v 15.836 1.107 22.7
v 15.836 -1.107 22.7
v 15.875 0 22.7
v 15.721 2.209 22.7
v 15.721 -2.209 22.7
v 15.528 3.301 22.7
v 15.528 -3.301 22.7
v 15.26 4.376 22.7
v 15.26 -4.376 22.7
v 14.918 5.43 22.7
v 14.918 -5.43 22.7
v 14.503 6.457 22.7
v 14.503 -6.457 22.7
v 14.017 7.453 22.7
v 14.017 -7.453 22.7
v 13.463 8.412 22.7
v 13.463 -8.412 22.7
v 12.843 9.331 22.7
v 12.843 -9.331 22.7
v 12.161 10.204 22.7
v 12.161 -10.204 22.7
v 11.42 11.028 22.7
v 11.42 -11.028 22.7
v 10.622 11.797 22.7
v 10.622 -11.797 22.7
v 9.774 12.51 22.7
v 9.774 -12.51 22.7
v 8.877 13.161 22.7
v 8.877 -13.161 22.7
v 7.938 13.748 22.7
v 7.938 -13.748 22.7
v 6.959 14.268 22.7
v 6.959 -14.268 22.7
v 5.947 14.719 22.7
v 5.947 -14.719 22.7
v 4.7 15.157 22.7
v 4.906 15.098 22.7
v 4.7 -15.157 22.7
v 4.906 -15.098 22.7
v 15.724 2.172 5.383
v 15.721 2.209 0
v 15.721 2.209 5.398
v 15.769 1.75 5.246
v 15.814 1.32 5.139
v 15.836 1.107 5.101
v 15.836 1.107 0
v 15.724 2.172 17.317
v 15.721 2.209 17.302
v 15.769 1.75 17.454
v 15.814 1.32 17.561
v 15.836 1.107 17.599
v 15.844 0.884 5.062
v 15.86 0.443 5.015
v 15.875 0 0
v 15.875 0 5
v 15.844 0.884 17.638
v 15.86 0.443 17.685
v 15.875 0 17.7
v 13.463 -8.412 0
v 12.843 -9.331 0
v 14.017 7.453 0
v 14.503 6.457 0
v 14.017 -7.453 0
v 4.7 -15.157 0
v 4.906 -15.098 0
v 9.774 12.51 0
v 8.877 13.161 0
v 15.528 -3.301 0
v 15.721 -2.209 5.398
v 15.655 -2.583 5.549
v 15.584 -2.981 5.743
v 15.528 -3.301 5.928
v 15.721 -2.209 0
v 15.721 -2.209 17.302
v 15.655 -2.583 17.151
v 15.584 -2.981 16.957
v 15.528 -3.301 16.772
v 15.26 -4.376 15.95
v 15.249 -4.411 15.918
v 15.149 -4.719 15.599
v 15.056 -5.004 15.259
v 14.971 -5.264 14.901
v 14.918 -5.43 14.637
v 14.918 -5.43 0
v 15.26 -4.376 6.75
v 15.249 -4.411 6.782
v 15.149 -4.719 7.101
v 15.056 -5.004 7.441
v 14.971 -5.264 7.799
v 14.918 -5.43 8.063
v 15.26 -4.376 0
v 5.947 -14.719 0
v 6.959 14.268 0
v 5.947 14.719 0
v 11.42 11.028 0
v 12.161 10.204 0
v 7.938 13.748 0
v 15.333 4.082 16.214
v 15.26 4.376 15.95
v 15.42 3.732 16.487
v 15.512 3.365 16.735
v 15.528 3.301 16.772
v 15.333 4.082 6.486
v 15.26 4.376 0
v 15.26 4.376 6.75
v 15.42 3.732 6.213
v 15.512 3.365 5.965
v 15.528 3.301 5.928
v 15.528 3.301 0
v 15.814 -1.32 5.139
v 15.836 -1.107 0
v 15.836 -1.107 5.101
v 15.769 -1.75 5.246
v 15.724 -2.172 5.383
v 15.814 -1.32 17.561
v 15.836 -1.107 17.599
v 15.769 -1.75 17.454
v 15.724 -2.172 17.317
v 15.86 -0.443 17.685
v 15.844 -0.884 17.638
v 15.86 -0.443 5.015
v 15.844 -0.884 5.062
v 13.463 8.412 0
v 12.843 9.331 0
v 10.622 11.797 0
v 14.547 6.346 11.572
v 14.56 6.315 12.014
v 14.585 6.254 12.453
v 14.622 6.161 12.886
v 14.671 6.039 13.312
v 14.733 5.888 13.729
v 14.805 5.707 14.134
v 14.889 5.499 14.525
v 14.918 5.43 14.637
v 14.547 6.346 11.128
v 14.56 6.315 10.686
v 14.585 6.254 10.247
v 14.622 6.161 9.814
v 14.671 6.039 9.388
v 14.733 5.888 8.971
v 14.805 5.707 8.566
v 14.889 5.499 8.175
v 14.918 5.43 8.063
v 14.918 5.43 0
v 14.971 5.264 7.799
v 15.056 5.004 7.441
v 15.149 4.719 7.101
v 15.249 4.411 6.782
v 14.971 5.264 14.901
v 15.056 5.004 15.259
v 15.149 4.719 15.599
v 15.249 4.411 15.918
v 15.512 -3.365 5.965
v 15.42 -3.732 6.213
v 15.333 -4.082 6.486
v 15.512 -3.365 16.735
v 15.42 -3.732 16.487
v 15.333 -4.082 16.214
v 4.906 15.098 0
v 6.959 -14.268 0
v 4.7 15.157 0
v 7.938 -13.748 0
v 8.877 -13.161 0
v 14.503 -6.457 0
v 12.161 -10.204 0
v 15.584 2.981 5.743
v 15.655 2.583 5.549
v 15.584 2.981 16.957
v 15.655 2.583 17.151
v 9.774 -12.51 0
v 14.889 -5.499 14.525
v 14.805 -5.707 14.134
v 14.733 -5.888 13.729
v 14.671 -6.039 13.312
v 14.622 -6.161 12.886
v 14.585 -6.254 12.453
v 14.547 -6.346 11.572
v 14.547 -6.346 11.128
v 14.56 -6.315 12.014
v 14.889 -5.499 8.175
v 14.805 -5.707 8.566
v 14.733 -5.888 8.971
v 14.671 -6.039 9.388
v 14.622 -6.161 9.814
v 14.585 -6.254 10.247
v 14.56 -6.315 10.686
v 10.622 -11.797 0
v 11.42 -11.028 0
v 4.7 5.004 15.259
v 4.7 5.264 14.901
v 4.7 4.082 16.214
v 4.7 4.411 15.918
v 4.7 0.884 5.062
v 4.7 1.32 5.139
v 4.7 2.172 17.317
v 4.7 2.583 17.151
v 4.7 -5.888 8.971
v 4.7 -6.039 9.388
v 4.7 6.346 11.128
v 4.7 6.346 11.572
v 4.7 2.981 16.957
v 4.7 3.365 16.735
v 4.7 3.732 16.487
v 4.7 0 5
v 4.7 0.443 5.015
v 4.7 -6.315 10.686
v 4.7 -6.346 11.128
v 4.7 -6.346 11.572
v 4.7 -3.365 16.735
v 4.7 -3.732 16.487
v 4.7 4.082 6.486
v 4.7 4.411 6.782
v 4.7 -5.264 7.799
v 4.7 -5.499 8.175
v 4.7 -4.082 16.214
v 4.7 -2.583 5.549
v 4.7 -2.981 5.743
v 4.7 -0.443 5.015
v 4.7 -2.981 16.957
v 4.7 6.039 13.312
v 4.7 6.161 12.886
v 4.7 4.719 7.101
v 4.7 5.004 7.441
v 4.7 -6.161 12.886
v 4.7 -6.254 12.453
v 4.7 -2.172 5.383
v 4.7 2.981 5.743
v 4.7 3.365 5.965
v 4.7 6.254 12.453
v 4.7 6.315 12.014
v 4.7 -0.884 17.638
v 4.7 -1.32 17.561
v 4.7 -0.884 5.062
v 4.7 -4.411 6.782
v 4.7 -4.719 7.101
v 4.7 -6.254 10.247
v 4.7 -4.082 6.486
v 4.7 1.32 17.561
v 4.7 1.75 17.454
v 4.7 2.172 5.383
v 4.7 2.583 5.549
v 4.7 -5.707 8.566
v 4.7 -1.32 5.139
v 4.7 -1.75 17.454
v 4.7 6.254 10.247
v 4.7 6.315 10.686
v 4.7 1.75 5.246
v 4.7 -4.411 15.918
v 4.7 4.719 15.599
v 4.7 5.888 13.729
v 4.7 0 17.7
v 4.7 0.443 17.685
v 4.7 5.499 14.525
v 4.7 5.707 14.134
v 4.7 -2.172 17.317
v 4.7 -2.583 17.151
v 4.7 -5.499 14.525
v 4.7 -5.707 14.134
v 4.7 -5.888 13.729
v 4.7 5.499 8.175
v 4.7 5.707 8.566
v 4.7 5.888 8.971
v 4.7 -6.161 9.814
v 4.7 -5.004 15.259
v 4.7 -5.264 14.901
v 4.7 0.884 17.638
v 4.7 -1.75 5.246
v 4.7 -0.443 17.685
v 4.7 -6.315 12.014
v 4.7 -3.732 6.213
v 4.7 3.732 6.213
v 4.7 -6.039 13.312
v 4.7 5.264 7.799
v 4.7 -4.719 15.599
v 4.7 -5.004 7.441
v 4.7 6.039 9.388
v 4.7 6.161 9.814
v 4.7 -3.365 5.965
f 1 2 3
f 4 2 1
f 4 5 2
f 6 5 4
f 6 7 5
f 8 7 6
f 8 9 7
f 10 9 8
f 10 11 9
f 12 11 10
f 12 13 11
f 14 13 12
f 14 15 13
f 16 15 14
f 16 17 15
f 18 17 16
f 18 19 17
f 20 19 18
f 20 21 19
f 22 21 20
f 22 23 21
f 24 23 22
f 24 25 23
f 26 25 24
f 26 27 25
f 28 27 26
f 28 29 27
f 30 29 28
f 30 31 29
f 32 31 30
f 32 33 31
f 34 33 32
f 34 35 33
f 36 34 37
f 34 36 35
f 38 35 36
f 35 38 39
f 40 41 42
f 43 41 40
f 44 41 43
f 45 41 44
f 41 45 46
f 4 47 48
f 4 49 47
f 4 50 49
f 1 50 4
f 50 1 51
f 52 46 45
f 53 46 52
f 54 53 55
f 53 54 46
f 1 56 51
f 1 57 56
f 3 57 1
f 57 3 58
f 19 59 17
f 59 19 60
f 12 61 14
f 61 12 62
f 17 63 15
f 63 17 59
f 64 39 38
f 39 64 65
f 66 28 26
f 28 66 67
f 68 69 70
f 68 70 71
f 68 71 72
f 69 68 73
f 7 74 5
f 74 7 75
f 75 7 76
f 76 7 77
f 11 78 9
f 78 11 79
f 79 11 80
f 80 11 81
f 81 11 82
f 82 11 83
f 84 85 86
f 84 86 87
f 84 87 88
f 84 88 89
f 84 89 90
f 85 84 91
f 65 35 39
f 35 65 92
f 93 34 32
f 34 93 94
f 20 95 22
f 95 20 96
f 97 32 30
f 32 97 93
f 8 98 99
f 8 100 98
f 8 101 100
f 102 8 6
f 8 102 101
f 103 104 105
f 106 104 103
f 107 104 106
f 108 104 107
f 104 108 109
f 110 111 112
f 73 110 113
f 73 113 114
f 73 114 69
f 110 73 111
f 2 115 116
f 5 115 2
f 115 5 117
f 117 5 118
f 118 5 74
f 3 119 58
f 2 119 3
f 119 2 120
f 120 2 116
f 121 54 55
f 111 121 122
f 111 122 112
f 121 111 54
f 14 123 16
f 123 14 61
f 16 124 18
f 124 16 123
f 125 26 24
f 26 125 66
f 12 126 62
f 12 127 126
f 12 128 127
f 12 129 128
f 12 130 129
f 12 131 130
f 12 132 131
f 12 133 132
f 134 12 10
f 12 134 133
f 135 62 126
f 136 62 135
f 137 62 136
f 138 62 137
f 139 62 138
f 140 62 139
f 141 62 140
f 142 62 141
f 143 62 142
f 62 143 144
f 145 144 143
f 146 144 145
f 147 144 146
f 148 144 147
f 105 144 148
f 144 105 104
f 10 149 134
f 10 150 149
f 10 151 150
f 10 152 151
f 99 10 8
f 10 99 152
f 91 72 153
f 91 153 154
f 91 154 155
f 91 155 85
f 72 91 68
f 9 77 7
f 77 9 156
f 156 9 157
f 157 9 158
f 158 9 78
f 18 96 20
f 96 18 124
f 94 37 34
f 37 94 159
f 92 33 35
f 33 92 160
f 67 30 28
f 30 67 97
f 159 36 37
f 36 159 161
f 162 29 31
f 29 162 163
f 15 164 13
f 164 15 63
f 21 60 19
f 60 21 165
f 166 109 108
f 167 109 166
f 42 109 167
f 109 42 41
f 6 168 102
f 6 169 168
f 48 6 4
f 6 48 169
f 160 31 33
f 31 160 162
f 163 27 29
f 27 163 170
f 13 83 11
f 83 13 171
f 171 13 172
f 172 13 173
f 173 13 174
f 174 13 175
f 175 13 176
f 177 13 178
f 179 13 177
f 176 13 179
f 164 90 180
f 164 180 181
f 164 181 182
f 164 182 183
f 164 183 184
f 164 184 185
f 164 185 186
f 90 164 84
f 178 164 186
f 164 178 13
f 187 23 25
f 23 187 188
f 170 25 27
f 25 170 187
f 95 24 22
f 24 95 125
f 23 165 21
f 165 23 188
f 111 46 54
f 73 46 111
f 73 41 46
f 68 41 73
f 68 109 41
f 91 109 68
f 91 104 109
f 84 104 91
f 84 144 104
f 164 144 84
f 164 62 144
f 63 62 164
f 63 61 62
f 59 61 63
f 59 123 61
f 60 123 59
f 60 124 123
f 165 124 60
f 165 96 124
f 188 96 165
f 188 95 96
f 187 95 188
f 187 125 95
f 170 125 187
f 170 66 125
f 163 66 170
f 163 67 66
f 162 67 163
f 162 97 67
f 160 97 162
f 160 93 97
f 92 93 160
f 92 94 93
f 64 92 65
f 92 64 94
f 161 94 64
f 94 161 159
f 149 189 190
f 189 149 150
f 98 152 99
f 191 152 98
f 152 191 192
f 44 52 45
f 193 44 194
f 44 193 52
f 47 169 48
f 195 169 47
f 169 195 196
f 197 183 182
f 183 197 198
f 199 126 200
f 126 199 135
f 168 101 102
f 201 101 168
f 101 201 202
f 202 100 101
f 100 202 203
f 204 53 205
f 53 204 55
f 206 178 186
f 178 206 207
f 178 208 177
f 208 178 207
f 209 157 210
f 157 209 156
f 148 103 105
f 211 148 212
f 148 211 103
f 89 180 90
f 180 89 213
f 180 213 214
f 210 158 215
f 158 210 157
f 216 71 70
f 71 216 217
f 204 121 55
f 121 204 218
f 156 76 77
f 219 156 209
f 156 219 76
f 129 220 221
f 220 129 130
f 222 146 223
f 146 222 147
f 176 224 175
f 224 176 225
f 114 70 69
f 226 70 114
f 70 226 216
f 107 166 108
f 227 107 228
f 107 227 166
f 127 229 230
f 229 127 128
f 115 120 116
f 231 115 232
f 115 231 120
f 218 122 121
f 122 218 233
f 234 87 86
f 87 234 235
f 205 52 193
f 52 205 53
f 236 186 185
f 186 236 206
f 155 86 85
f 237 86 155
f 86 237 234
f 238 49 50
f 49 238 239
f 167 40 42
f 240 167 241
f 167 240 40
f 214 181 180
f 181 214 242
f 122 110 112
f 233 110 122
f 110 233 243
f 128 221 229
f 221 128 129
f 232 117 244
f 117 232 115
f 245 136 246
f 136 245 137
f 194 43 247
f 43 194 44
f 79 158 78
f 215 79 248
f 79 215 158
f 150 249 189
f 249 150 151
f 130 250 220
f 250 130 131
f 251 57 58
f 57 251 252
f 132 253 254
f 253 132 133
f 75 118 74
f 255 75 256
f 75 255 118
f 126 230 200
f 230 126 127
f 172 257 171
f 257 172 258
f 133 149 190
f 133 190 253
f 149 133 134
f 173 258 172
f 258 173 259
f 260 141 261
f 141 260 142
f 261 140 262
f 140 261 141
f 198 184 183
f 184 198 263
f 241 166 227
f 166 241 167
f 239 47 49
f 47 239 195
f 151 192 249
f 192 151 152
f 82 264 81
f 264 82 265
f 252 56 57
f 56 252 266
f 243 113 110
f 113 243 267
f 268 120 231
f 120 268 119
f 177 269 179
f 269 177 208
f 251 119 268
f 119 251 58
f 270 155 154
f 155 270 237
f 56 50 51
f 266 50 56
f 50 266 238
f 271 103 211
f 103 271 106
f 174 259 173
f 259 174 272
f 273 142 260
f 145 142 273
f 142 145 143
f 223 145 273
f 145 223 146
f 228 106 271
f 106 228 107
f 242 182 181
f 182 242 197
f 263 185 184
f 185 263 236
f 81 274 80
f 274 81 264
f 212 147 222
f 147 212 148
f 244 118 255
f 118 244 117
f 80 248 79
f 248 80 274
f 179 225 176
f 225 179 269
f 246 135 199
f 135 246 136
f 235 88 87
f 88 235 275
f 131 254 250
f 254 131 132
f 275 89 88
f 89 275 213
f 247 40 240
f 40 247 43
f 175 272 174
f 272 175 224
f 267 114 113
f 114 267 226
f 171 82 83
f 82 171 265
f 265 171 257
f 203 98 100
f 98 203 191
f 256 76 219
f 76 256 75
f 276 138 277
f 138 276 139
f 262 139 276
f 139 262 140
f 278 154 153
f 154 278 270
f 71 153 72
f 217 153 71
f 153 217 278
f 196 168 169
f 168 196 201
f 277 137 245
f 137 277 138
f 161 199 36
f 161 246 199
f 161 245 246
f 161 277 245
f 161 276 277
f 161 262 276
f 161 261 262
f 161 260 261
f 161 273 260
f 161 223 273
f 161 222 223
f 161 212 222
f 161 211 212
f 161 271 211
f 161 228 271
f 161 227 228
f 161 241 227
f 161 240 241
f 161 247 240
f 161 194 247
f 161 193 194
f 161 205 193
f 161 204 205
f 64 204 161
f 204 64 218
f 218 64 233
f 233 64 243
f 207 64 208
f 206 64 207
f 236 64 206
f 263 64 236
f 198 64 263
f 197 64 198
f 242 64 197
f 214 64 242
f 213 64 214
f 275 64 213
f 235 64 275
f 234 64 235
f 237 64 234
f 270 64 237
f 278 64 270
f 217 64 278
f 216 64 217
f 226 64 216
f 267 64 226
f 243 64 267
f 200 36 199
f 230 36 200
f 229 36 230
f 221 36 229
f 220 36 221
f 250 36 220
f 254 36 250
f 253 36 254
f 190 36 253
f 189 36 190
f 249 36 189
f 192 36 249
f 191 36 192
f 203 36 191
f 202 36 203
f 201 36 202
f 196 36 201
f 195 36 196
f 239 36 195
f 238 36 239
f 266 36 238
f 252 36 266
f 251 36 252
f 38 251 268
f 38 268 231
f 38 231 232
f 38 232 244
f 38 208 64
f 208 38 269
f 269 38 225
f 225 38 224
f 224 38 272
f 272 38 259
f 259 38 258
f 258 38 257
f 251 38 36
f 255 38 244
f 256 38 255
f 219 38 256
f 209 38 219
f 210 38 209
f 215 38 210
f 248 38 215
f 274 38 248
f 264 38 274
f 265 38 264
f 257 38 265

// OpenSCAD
// file: dim.scad
MM_TO_INCHES = 1 / 25.4;
INCHES_TO_MM = 25.4;

D_FORWARD			= 1.00 * INCHES_TO_MM;
D_AFT				= 1.25 * INCHES_TO_MM;	// FIXME
R_FORWARD 			=  D_FORWARD / 2;
R_AFT 				= D_AFT / 2;

D_PORT_SCREW		= 0.5 * INCHES_TO_MM;	// FIXME
R_PORT_SCREW 		= D_PORT_SCREW / 2;
PORT_SCREW_PAD		= 5;
PORT_LEN			= D_PORT_SCREW + PORT_SCREW_PAD * 2;

H_PORT				= 8;	// FIXME

FACES 				= 90;
// file: ../shapes.scad
FACES = 180;
EPSILON = 0.1;

module tube(p_h, rOuter, rInner) {
	difference() {
		cylinder(h=p_h, r=rOuter, $fn=FACES);
		translate([0,0,-EPSILON]) {
			cylinder(h=p_h + EPSILON*2, r=rInner, $fn=FACES);
		}
	}
}
// main file
use <../threads.scad>
use <../shapes.scad>
include <dim.scad>

intersection() {
    difference() {
        cylinder(h=PORT_LEN, r=R_AFT, $fn=FACES);
        translate([0,0,PORT_SCREW_PAD + R_PORT_SCREW]) {
            rotate([0,90,0]) {
                if (false) {
                   english_thread(diameter=0.5, length=PORT_LEN, threads_per_inch=28, internal=true);
                }
                else {
                    cylinder(h=PORT_LEN, r=D_PORT_SCREW/2, $fn=FACES);
                }
            }
        }
    }

    translate([R_FORWARD - H_PORT,-100,0]) {
      cube(size=[200, 200, 200]);    
    }
}
